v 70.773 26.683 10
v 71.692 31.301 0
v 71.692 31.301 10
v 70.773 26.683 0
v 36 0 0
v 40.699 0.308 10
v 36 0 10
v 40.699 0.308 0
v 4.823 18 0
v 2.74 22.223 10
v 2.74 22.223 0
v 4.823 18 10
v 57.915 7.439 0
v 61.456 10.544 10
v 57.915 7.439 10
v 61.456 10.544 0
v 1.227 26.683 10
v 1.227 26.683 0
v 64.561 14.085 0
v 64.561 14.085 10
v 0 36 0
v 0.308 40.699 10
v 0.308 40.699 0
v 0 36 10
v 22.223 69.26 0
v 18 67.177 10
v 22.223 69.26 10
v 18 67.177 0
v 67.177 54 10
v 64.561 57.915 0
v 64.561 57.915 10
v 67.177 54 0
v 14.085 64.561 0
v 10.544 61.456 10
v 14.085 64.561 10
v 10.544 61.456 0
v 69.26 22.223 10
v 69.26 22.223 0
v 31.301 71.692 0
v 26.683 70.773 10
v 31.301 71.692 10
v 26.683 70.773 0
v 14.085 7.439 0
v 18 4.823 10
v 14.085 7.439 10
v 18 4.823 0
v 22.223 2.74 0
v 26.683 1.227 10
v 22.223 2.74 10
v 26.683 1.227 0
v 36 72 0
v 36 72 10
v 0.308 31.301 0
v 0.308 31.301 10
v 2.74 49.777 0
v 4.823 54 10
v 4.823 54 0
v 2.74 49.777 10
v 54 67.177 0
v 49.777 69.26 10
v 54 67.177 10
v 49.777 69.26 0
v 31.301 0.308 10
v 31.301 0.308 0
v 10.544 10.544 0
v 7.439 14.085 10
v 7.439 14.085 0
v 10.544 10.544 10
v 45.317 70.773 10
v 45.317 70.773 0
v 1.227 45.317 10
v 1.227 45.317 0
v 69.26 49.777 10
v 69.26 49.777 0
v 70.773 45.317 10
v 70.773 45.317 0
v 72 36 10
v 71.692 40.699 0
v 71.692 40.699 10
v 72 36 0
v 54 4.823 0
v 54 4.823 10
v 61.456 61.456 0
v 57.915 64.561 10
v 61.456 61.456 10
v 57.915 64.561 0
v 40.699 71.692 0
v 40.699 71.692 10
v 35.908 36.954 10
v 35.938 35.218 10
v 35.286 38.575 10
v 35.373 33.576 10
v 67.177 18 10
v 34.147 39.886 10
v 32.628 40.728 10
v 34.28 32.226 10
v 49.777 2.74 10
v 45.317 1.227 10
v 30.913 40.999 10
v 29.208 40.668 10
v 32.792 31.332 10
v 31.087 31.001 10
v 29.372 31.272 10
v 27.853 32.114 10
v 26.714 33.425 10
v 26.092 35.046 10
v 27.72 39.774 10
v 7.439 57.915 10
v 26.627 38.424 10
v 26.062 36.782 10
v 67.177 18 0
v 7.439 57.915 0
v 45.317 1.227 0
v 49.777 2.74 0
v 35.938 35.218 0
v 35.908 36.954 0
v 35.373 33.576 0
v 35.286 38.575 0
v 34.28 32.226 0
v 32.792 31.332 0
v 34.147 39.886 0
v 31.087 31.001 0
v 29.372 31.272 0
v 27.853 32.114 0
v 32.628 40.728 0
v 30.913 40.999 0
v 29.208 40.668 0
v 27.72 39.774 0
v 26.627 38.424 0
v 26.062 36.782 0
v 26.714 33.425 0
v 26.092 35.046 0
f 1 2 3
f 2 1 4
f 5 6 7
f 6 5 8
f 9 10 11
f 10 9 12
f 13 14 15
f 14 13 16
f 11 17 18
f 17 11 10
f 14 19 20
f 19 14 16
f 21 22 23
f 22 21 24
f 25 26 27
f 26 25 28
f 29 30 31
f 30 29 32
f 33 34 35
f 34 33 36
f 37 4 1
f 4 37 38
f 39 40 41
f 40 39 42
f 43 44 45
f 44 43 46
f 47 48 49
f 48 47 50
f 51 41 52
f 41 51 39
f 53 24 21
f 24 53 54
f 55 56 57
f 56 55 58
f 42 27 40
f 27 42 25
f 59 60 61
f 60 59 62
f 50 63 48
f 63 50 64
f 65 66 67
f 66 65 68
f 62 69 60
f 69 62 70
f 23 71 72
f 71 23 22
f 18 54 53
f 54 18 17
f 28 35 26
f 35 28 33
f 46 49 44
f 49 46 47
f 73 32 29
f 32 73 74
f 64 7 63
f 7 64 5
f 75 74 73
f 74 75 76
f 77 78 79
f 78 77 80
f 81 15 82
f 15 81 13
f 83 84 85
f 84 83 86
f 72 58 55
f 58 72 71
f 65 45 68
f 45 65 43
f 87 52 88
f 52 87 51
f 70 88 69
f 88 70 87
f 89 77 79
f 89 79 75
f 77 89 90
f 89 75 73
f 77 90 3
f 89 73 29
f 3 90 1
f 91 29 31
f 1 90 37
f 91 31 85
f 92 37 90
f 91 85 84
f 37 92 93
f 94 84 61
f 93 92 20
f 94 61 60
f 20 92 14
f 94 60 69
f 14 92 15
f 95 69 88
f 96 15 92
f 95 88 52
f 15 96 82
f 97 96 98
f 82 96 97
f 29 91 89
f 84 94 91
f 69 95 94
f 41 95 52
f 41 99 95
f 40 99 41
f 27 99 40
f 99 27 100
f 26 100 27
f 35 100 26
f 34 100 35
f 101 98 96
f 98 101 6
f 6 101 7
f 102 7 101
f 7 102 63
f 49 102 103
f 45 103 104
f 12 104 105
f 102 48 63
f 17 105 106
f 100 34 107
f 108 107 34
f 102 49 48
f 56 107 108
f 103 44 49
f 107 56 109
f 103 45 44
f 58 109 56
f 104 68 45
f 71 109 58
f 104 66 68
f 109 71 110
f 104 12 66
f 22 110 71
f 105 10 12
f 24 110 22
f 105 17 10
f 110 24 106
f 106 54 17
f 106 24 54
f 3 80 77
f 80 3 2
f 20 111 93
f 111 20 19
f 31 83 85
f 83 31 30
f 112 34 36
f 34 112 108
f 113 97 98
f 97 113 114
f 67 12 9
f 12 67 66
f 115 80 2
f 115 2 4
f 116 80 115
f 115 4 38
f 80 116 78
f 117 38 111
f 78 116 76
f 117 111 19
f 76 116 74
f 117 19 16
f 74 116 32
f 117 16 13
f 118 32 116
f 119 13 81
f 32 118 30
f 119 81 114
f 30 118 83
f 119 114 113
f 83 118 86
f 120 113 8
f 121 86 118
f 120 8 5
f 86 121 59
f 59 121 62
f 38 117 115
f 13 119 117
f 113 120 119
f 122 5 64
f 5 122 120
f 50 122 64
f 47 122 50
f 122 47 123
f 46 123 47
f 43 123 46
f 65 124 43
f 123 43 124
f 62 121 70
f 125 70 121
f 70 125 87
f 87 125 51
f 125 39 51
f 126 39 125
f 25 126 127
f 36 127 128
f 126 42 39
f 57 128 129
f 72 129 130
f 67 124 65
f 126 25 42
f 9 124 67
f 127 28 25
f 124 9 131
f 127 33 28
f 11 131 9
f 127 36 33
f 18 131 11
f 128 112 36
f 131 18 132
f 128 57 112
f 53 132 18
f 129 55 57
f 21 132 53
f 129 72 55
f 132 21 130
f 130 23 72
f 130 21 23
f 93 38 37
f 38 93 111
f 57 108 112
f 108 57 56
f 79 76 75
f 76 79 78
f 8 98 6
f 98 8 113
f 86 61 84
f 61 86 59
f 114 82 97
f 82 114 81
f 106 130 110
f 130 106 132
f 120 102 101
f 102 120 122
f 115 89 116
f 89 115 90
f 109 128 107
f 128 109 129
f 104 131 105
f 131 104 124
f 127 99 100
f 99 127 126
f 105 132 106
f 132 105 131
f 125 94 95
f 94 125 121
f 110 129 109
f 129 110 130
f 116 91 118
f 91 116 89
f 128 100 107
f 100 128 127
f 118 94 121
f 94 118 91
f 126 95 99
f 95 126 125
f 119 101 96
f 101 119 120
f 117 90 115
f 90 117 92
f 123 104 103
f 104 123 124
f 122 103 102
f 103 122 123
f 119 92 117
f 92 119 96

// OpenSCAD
$fn = 32;

// ----------------------------------------------------------------------
// Cam plate: eccentric cam, base R36
// ----------------------------------------------------------------------

// --- parameters (mm) ---
base_r = 36;              // base circle radius
lobe_h = 10;              // cam lobe rise
bore_r = 5;               // shaft bore radius
plate_t = 10;             // plate thickness, Z (extrusion height)
ecc = 5;                  // disc eccentricity

profile = [[72, 36], [71.692, 40.699], [70.773, 45.317], [69.26, 49.777], [67.177, 54], [64.561, 57.915], [61.456, 61.456], [57.915, 64.561], [54, 67.177], [49.777, 69.26], [45.317, 70.773], [40.699, 71.692], [36, 72], [31.301, 71.692], [26.683, 70.773], [22.223, 69.26], [18, 67.177], [14.085, 64.561], [10.544, 61.456], [7.439, 57.915], [4.823, 54], [2.74, 49.777], [1.227, 45.317], [0.308, 40.699], [0, 36], [0.308, 31.301], [1.227, 26.683], [2.74, 22.223], [4.823, 18], [7.439, 14.085], [10.544, 10.544], [14.085, 7.439], [18, 4.823], [22.223, 2.74], [26.683, 1.227], [31.301, 0.308], [36, 0], [40.699, 0.308], [45.317, 1.227], [49.777, 2.74], [54, 4.823], [57.915, 7.439], [61.456, 10.544], [64.561, 14.085], [67.177, 18], [69.26, 22.223], [70.773, 26.683], [71.692, 31.301]];  // primary outline, 48 points, counter clockwise
void_1 = [[35.908, 36.954], [35.286, 38.575], [34.147, 39.886], [32.628, 40.728], [30.913, 40.999], [29.208, 40.668], [27.72, 39.774], [26.627, 38.424], [26.062, 36.782], [26.092, 35.046], [26.714, 33.425], [27.853, 32.114], [29.372, 31.272], [31.087, 31.001], [32.792, 31.332], [34.28, 32.226], [35.373, 33.576], [35.938, 35.218]];  // shaft bore, 18 points

// --- the one profile operation ---
difference() {
  linear_extrude(height = plate_t) polygon(points = profile);
  translate([0, 0, -1])
    linear_extrude(height = plate_t + 2) polygon(points = void_1);
}
